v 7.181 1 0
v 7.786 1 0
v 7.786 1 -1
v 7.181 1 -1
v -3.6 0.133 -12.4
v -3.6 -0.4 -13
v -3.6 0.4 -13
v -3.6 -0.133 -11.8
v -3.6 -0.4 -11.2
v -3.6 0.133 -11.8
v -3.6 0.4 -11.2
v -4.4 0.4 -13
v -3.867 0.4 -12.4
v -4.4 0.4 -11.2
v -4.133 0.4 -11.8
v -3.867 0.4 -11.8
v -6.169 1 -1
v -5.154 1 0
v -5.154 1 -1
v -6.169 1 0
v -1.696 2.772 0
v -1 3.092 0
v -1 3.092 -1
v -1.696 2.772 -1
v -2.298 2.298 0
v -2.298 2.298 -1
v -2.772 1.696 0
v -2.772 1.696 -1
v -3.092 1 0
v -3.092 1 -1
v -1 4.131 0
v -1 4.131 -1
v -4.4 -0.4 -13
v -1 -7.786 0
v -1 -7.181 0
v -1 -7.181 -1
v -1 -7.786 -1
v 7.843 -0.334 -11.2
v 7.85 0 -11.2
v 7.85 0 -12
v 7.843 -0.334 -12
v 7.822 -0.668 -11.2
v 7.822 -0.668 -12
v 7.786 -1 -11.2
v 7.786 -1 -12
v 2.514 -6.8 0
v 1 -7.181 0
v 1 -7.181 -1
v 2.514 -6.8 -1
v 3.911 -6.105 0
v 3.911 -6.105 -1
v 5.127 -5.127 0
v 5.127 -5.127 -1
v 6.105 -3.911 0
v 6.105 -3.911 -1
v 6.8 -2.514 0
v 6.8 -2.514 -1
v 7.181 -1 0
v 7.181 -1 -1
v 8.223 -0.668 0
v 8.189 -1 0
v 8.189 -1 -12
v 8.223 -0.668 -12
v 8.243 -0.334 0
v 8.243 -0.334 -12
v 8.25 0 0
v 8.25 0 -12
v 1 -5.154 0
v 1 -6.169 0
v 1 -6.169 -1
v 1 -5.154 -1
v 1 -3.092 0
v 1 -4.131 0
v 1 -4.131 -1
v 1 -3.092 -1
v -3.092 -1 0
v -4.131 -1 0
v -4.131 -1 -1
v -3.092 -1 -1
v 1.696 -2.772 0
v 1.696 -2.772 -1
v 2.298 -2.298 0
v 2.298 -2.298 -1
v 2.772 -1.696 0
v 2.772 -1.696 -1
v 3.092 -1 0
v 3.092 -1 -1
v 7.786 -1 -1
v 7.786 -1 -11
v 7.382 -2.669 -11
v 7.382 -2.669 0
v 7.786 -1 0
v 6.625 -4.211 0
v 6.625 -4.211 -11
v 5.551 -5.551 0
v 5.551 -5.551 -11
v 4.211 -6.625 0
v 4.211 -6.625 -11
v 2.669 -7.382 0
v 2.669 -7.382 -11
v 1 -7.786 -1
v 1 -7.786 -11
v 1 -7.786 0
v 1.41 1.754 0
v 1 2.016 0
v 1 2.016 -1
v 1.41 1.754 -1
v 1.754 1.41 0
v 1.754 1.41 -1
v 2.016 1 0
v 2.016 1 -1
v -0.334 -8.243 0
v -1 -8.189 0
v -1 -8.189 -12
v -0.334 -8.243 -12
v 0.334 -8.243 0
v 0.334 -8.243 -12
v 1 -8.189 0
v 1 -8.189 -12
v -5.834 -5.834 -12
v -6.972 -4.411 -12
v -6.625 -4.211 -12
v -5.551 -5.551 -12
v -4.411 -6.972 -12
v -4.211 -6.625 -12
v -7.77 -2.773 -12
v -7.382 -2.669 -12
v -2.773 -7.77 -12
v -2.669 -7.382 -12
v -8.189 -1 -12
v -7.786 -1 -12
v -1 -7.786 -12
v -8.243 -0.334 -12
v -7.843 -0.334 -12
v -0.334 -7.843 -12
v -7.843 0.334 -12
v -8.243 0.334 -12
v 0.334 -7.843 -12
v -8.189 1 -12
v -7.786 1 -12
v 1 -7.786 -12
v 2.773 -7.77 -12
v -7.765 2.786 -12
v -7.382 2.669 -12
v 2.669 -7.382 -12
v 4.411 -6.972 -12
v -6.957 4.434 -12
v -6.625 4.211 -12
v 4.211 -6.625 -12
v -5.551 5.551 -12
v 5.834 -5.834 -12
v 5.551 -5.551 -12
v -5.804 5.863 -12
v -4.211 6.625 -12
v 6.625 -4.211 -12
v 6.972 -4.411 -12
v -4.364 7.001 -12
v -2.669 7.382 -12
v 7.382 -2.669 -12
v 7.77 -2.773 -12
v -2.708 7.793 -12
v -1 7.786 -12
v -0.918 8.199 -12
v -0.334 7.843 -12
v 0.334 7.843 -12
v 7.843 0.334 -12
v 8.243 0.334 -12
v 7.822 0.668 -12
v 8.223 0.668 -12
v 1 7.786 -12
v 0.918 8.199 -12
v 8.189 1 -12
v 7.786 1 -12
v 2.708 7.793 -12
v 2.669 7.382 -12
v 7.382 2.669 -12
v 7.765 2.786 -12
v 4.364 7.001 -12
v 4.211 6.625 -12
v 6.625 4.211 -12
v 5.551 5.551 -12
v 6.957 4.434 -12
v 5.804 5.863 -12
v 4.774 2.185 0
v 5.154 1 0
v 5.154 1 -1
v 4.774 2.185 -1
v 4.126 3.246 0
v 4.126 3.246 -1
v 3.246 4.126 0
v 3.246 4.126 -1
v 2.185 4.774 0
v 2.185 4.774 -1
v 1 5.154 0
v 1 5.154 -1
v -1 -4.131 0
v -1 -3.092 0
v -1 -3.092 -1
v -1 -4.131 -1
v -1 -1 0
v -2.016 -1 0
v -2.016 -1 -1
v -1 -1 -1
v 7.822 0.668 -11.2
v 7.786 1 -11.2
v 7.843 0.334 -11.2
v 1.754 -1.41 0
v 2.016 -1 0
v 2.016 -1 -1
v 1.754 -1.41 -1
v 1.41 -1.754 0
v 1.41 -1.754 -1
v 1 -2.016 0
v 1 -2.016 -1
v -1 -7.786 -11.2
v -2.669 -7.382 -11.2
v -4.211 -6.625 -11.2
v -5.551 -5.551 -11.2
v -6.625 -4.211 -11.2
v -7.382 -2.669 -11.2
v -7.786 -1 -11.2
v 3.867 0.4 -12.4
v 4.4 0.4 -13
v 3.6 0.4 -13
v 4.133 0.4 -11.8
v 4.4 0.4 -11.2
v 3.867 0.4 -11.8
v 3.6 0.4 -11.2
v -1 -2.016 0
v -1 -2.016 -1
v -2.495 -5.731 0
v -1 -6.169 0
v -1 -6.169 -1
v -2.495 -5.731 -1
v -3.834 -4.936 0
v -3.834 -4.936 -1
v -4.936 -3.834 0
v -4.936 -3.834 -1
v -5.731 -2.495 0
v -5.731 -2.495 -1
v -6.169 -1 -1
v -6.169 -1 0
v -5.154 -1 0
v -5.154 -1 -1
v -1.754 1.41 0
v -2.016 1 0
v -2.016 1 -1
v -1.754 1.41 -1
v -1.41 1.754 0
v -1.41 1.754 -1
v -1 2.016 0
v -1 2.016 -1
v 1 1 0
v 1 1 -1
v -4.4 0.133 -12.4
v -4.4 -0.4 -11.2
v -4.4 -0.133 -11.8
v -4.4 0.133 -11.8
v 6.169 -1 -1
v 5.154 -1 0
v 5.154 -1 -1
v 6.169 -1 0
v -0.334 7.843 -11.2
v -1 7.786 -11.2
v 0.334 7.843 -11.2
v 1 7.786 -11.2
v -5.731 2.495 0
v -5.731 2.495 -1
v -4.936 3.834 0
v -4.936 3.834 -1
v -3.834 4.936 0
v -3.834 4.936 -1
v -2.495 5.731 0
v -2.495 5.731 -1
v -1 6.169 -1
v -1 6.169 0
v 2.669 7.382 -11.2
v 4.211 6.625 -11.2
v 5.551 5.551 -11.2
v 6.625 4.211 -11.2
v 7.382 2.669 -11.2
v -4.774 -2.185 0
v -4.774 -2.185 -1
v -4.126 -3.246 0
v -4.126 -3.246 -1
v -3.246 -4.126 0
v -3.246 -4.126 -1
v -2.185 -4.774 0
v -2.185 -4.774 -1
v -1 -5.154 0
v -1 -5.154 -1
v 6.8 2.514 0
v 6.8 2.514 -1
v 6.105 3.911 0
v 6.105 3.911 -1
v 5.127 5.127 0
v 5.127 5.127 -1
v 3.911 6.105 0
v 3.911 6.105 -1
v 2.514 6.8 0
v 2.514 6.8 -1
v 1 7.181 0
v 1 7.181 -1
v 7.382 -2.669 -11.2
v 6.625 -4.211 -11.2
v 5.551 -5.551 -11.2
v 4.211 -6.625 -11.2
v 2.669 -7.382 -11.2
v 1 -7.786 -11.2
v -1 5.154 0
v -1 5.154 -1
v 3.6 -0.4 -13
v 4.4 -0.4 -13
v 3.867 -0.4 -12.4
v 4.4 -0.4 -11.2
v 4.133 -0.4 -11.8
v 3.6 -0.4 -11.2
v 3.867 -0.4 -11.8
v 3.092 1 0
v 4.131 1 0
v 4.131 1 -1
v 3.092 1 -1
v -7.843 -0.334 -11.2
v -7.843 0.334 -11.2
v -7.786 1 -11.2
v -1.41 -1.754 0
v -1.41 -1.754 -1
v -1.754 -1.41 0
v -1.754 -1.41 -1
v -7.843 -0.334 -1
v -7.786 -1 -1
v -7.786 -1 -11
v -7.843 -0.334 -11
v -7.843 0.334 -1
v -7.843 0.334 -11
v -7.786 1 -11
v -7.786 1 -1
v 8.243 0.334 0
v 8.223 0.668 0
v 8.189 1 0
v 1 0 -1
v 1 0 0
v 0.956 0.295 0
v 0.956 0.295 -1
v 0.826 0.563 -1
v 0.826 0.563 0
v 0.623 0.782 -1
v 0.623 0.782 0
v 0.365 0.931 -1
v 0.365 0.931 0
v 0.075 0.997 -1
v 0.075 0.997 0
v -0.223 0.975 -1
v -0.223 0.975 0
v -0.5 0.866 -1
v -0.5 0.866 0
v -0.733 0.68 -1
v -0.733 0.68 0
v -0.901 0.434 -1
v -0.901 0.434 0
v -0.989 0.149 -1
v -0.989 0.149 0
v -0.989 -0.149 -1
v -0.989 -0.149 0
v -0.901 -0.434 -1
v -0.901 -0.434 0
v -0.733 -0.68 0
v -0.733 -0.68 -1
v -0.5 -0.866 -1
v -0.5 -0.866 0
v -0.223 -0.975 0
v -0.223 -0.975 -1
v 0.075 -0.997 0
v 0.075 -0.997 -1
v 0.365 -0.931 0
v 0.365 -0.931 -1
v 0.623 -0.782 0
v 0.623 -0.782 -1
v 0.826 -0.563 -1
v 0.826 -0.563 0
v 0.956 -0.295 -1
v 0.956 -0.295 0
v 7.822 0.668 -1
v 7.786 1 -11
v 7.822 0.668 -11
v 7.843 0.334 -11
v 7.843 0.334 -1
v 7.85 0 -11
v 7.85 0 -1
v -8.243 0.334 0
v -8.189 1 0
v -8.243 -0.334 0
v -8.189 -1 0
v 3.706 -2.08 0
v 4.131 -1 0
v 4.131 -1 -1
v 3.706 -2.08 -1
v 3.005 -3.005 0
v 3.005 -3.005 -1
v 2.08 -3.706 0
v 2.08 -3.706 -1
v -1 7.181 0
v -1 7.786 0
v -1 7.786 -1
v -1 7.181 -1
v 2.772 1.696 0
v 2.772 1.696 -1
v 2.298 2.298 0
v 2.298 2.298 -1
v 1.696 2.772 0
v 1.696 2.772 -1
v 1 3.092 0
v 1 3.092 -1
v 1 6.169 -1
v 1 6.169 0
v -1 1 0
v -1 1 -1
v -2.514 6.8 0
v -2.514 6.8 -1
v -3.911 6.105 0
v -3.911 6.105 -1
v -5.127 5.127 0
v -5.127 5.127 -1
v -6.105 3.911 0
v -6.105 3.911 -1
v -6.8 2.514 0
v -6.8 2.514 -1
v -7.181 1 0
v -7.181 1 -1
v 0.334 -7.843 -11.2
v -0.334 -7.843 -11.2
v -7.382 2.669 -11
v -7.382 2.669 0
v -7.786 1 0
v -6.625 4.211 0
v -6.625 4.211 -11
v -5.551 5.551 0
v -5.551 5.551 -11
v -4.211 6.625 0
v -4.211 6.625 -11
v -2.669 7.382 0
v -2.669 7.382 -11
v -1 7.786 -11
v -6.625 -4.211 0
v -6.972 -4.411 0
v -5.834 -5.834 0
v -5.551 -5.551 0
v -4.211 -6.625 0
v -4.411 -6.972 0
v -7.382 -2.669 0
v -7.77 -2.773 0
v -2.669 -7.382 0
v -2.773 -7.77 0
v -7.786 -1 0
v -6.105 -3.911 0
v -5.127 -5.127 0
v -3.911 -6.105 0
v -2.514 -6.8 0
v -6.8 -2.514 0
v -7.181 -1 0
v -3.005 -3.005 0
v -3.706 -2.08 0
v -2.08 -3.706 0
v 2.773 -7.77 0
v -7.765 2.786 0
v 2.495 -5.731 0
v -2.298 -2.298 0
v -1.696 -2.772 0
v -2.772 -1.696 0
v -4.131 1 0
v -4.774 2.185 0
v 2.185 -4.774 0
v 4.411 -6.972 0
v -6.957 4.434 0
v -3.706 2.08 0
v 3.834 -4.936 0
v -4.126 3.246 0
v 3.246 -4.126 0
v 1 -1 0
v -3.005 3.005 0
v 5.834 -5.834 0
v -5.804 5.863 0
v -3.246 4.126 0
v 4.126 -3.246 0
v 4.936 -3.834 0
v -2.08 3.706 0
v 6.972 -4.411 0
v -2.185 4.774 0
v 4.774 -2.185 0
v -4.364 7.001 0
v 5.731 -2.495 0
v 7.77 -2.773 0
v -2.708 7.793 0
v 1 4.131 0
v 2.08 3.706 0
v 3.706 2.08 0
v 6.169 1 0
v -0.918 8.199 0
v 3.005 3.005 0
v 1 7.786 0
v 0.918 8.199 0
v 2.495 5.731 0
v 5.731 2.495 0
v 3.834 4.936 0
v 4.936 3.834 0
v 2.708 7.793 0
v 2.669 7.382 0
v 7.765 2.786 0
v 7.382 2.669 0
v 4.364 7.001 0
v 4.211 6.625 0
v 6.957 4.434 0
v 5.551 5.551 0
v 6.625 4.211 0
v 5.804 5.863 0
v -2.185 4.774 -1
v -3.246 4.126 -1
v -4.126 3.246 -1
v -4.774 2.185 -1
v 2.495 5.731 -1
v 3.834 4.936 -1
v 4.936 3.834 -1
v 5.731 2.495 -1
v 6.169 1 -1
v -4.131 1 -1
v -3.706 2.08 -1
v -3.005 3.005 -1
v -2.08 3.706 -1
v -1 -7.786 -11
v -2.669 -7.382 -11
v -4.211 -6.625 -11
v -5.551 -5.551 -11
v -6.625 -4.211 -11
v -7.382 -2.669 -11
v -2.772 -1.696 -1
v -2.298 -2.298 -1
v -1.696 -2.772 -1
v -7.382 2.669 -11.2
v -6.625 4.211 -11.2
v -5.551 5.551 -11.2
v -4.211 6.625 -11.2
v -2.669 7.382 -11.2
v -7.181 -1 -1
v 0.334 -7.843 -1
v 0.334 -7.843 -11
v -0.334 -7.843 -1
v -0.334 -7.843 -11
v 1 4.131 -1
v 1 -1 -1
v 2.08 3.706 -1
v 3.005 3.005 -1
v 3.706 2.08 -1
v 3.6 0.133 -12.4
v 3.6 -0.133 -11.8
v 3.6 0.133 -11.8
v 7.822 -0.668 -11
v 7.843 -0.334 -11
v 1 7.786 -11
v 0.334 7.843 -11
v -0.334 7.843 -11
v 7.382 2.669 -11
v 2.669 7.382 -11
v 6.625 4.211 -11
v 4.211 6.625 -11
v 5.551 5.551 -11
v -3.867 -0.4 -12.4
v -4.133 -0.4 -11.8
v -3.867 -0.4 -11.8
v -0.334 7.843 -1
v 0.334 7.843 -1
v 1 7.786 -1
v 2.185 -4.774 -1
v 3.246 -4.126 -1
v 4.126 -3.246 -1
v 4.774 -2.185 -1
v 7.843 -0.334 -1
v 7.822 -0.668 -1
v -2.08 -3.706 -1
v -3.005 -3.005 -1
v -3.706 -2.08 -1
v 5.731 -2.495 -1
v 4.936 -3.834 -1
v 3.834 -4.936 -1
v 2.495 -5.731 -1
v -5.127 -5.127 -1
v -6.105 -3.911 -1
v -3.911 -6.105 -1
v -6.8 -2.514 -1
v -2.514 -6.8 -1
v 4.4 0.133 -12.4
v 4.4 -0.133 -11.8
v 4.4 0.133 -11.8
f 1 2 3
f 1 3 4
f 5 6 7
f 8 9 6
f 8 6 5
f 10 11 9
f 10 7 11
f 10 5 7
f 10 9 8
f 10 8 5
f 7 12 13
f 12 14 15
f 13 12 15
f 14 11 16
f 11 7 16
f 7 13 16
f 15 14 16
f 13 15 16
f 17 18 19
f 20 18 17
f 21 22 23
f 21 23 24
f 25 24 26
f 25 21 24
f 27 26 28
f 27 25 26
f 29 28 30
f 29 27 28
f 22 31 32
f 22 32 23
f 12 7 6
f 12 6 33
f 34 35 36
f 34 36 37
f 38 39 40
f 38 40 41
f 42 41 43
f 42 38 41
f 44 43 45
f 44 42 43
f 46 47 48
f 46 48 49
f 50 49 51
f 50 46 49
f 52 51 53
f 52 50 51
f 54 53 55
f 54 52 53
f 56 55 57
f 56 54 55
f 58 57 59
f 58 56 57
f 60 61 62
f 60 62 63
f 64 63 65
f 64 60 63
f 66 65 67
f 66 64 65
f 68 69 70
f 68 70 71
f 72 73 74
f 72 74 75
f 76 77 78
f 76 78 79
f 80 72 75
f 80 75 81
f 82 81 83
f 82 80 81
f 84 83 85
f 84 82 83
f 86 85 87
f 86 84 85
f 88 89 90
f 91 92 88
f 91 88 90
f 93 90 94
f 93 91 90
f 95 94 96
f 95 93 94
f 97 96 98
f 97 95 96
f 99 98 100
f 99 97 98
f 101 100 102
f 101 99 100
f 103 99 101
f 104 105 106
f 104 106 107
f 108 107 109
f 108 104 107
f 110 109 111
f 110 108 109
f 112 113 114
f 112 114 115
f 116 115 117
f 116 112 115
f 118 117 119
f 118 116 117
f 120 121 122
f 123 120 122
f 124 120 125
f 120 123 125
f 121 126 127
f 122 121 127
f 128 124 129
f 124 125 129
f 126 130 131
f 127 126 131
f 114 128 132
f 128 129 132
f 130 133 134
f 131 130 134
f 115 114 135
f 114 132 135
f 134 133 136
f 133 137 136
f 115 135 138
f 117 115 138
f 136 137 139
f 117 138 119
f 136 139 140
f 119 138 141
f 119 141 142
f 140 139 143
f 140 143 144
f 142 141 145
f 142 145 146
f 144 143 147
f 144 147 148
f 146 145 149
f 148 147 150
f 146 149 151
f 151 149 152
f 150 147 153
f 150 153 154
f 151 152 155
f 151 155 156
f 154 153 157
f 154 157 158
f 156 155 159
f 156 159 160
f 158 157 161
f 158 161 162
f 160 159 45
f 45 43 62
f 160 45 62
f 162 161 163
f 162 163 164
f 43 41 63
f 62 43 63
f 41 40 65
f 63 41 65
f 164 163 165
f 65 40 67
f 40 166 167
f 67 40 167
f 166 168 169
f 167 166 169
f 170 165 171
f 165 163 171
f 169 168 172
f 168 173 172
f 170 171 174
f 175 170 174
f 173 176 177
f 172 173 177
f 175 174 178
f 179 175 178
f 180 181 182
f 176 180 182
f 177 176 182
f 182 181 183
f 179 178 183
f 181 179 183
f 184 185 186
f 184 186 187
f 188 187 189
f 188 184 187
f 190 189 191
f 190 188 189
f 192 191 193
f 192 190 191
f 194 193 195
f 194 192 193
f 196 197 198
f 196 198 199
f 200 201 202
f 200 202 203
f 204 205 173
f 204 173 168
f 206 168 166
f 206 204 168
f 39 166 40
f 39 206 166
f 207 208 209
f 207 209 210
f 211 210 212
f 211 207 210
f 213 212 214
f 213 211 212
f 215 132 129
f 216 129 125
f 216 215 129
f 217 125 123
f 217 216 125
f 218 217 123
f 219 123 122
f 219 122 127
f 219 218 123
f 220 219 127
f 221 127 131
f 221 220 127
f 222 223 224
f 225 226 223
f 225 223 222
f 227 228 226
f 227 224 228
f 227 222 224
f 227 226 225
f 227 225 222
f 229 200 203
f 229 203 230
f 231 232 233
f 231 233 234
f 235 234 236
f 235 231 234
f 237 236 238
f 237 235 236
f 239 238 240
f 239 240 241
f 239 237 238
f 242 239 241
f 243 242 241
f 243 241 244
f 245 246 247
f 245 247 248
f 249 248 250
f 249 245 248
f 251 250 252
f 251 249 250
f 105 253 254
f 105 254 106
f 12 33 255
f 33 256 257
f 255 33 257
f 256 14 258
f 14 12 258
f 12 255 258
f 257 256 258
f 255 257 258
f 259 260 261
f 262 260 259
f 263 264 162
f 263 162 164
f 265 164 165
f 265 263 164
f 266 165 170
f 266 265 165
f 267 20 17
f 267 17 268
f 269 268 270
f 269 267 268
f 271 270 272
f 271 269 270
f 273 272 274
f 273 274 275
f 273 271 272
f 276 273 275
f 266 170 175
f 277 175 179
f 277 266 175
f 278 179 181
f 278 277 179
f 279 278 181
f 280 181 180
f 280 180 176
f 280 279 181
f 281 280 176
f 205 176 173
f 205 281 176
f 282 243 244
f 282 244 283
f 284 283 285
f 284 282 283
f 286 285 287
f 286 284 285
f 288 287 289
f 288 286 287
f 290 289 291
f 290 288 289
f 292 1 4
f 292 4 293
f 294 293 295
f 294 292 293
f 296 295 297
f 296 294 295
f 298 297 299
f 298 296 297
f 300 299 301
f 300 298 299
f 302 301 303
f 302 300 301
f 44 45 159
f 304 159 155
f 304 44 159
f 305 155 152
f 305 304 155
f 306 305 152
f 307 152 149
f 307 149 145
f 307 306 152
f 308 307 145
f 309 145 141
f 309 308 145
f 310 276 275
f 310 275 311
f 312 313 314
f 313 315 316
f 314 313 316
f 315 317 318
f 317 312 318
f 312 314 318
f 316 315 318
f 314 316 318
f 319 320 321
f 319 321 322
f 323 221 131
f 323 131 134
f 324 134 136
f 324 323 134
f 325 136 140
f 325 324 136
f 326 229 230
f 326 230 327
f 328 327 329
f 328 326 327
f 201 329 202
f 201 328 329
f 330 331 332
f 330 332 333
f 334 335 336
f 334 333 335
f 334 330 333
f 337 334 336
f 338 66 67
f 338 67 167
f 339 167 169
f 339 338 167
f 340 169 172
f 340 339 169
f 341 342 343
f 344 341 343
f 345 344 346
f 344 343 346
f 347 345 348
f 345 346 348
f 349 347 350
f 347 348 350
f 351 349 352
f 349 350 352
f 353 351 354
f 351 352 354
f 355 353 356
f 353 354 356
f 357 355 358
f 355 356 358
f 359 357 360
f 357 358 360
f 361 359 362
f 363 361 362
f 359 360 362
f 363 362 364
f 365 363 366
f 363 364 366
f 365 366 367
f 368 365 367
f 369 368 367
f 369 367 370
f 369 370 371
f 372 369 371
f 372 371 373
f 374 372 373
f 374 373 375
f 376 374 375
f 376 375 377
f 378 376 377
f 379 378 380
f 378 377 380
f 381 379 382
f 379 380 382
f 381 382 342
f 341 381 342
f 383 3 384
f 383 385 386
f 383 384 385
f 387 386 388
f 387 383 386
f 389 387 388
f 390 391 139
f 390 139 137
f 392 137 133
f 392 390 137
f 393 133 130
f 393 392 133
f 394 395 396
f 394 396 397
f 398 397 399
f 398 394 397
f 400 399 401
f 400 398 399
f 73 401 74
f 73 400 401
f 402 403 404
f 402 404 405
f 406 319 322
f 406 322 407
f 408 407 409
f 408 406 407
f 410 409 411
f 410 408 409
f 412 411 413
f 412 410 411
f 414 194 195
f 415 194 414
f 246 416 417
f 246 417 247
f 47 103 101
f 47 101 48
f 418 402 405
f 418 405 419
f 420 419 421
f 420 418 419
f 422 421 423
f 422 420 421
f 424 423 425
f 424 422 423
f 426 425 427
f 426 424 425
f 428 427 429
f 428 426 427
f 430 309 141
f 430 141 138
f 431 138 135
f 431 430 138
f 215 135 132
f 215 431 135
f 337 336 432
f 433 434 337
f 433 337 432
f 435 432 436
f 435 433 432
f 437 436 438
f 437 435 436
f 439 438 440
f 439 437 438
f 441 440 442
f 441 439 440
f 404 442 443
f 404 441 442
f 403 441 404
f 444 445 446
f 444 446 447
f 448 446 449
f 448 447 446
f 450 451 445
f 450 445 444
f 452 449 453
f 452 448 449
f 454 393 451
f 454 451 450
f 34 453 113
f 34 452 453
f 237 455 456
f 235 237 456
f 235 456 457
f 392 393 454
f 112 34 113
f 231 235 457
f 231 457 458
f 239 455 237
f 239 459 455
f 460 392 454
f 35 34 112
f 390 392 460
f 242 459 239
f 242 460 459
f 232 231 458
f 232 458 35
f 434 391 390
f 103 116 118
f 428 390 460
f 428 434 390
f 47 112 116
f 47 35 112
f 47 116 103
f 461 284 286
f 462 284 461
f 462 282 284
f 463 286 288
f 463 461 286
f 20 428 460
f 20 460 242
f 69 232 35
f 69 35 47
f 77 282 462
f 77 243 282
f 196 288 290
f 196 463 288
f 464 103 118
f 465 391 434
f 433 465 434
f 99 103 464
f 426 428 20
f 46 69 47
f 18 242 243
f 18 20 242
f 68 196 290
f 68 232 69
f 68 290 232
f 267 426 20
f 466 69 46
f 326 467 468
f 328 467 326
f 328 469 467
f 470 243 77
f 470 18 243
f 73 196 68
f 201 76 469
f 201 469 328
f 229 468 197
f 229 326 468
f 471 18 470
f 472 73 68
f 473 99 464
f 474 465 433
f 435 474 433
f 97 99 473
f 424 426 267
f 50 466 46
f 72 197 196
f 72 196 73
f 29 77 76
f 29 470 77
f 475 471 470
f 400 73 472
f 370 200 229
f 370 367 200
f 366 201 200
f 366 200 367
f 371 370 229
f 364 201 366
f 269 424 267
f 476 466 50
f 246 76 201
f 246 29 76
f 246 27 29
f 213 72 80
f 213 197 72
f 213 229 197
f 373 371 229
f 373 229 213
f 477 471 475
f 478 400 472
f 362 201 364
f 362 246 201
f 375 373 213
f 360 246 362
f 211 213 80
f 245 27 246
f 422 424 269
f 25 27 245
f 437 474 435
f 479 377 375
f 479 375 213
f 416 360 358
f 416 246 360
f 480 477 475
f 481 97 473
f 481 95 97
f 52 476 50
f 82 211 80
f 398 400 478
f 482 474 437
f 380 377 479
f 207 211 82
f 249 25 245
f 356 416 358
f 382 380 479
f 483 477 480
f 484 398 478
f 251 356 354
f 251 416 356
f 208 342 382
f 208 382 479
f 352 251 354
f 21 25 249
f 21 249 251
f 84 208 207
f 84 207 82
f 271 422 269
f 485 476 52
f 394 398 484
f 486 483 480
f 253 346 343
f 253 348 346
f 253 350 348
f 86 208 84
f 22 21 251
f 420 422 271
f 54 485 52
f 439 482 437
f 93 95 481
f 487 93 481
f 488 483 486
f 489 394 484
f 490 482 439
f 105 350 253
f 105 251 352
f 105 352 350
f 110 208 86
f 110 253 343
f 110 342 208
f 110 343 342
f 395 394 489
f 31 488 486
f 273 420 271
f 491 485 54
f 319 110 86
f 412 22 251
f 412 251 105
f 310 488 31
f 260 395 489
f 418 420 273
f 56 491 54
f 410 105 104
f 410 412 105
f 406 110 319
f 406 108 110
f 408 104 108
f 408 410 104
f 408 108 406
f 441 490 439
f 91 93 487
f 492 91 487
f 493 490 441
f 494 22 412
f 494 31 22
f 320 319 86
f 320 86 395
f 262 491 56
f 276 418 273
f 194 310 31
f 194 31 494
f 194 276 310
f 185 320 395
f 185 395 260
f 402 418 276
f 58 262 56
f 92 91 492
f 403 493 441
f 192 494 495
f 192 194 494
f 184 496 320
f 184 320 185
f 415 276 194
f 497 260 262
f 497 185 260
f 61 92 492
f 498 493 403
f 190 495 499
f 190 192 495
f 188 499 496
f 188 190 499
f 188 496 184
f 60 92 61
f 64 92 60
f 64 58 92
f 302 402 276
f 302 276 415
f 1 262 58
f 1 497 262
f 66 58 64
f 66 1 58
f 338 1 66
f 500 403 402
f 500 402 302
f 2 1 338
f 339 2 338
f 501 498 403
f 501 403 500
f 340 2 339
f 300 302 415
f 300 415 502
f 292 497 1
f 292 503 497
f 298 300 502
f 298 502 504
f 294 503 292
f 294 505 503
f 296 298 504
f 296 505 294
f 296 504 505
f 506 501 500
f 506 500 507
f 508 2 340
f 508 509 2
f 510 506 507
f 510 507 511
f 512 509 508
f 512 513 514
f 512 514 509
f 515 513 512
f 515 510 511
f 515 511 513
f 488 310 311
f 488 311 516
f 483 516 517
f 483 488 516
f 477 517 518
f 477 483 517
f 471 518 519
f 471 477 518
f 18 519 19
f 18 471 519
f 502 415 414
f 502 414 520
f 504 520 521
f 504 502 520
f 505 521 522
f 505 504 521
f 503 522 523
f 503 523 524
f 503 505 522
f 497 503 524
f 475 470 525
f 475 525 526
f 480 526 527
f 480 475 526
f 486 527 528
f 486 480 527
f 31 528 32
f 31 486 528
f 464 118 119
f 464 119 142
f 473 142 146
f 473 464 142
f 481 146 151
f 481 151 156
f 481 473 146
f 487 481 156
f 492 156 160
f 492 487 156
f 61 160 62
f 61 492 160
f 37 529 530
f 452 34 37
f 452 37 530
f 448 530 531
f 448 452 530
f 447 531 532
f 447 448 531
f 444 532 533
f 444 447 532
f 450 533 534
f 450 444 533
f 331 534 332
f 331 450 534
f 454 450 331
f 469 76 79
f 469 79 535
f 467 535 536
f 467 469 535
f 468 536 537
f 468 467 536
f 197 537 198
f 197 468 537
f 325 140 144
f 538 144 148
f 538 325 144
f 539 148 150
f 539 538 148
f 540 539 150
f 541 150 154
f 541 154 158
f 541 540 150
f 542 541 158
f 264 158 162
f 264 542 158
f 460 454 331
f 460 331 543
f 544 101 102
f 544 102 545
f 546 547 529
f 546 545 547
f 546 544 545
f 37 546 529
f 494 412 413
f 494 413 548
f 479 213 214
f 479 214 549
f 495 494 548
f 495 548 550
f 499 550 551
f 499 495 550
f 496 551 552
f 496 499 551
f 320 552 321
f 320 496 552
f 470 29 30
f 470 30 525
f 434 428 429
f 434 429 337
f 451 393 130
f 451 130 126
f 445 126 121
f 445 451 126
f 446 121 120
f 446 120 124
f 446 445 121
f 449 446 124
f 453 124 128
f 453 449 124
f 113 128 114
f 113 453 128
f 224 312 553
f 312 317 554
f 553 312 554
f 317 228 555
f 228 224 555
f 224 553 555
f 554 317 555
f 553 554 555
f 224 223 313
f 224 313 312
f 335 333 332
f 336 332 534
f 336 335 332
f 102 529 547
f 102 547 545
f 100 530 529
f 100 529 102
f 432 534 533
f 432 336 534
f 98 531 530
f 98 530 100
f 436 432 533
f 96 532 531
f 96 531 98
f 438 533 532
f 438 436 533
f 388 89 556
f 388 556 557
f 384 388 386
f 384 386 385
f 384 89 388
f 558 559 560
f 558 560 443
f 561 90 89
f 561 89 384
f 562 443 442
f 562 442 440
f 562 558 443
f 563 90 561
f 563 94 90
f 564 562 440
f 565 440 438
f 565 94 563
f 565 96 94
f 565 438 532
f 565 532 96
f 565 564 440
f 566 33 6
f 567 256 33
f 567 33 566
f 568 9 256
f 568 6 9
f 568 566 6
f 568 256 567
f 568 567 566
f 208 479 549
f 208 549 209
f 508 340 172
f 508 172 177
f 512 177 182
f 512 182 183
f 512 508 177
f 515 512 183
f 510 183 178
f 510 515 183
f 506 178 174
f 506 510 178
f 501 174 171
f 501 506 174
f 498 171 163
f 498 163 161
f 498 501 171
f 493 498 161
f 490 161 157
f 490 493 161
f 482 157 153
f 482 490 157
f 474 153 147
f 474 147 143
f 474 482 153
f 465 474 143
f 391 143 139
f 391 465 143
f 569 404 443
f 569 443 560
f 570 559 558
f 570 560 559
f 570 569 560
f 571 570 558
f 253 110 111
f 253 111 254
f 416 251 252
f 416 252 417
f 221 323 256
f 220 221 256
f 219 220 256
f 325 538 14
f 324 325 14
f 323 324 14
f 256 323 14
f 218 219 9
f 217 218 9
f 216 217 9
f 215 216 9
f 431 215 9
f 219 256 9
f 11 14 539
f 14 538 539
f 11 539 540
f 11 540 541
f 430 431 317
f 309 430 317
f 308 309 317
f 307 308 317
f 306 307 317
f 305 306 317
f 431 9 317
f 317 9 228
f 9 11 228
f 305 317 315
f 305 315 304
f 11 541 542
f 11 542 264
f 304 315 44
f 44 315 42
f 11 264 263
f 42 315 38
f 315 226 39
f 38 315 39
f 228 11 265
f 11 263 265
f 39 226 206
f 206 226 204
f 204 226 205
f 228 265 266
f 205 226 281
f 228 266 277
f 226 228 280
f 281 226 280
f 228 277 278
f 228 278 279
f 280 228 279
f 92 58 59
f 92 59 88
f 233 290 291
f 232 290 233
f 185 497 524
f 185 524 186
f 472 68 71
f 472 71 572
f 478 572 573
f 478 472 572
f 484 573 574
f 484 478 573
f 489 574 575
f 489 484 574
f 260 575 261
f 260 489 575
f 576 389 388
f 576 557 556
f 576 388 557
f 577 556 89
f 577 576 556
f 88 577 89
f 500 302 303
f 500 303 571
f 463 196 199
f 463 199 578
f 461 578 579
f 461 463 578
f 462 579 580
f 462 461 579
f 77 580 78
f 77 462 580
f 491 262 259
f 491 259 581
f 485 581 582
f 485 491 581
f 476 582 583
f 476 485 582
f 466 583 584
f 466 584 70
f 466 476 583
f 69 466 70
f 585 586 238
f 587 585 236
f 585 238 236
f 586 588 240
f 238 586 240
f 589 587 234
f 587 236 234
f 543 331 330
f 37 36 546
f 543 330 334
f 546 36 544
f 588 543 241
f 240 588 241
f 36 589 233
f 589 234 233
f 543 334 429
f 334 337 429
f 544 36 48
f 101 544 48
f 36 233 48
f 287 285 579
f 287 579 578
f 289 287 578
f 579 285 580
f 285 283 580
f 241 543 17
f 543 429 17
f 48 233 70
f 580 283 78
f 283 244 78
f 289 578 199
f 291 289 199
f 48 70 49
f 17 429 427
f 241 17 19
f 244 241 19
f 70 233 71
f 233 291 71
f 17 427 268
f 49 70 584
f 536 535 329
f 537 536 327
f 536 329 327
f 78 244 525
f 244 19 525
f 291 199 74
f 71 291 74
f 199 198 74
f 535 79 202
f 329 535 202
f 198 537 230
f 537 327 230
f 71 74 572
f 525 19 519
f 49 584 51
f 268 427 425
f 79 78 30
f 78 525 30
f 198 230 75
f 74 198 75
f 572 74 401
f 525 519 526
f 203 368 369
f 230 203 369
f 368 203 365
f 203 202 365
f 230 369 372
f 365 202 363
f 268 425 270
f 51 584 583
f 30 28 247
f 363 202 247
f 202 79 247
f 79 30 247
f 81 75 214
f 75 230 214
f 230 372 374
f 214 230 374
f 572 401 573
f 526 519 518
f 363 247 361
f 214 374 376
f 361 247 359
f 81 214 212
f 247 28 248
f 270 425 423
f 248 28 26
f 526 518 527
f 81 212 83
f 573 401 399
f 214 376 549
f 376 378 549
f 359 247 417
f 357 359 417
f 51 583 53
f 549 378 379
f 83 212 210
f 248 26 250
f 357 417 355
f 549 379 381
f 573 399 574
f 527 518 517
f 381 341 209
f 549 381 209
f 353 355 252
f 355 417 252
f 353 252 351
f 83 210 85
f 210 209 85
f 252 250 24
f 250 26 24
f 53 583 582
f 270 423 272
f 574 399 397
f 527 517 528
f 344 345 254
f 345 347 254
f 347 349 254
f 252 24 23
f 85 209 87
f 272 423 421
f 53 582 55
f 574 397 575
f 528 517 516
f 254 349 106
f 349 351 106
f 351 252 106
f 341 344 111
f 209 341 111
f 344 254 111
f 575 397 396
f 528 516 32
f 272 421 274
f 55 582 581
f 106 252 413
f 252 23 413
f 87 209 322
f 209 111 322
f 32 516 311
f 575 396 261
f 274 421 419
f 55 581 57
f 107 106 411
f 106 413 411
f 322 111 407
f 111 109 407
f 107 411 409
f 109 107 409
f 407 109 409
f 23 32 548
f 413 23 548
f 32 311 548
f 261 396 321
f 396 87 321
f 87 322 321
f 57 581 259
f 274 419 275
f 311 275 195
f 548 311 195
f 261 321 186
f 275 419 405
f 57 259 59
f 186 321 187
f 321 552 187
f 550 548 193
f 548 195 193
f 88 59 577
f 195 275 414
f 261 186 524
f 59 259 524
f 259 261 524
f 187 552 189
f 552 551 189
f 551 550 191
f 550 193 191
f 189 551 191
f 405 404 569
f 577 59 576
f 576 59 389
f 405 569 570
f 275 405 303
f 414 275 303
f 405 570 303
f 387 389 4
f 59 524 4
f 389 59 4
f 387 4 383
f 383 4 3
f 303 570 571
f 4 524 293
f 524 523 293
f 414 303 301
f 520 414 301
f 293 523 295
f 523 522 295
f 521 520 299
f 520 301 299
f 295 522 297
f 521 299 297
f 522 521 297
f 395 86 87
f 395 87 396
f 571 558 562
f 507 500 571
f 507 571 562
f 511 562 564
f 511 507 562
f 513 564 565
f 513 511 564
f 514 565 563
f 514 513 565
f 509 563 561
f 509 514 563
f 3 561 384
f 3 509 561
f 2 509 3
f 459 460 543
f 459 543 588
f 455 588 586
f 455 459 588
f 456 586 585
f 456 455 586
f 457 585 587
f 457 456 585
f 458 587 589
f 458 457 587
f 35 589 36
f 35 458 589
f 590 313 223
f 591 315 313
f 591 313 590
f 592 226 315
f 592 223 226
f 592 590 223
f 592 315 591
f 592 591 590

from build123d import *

# Parameters (mm, degrees)
F0_R     = 1
F3_DEPTH = 1
F4_DEPTH = 12
F2_R     = 7.92
F2_R_2   = 7.12
F5_DEPTH = 0.2
F6_DEPTH = 2


with BuildPart() as f3:
    # F0 (on Top) → F3 (new body)
    with BuildSketch(Plane.XY):
        with BuildLine():
            Line((-1, 7.7860452092), (-1, 7.1807033082))
            ThreePointArc((-1, 7.1807033082), (-5.1265241636, 5.1265241636), (-7.1807033082, 1))
            Line((-7.1807033082, 1), (-7.7860452092, 1))
            ThreePointArc((-7.7860452092, 1), (-7.85, 0), (-7.7860452092, -1))
            Line((-7.7860452092, -1), (-7.1807033082, -1))
            ThreePointArc((-7.1807033082, -1), (-5.1265241636, -5.1265241636), (-1, -7.1807033082))
            Line((-1, -7.1807033082), (-1, -7.7860452092))
            ThreePointArc((-1, -7.7860452092), (0, -7.85), (1, -7.7860452092))
            Line((1, -7.7860452092), (1, -7.1807033082))
            ThreePointArc((1, -7.1807033082), (5.1265241636, -5.1265241636), (7.1807033082, -1))
            Line((7.1807033082, -1), (7.7860452092, -1))
            ThreePointArc((7.7860452092, -1), (7.8339949864, -0.5010215103), (7.85, 0))
            ThreePointArc((7.85, 0), (7.8339949864, 0.5010215103), (7.7860452092, 1))
            Line((7.7860452092, 1), (7.1807033082, 1))
            ThreePointArc((7.1807033082, 1), (5.1265241636, 5.1265241636), (1, 7.1807033082))
            Line((1, 7.1807033082), (1, 7.7860452092))
            ThreePointArc((1, 7.7860452092), (0, 7.85), (-1, 7.7860452092))
        make_face()
        with BuildLine():
            Line((-6.1694813396, -1), (-5.153882032, -1))
            ThreePointArc((-5.153882032, -1), (-3.7123106012, -3.7123106012), (-1, -5.153882032))
            Line((-1, -5.153882032), (-1, -6.1694813396))
            ThreePointArc((-1, -6.1694813396), (-4.4194173824, -4.4194173824), (-6.1694813396, -1))
        make_face(mode=Mode.SUBTRACT)
        with BuildLine():
            ThreePointArc((-1, -4.1306779105), (-3.00520382, -3.00520382), (-4.1306779105, -1))
            Line((-4.1306779105, -1), (-3.0923292192, -1))
            ThreePointArc((-3.0923292192, -1), (-2.2980970389, -2.2980970389), (-1, -3.0923292192))
            Line((-1, -3.0923292192), (-1, -4.1306779105))
        make_face(mode=Mode.SUBTRACT)
        with BuildLine():
            ThreePointArc((-1, -2.0155644371), (-1.5909902577, -1.5909902577), (-2.0155644371, -1))
            Line((-2.0155644371, -1), (-1, -1))
            Line((-1, -1), (-1, -2.0155644371))
        make_face(mode=Mode.SUBTRACT)
        with BuildLine():
            ThreePointArc((6.1694813396, -1), (4.4194173824, -4.4194173824), (1, -6.1694813396))
            Line((1, -6.1694813396), (1, -5.153882032))
            ThreePointArc((1, -5.153882032), (3.7123106012, -3.7123106012), (5.153882032, -1))
            Line((5.153882032, -1), (6.1694813396, -1))
        make_face(mode=Mode.SUBTRACT)
        with BuildLine():
            Line((3.0923292192, -1), (4.1306779105, -1))
            ThreePointArc((4.1306779105, -1), (3.00520382, -3.00520382), (1, -4.1306779105))
            Line((1, -4.1306779105), (1, -3.0923292192))
            ThreePointArc((1, -3.0923292192), (2.2980970389, -2.2980970389), (3.0923292192, -1))
        make_face(mode=Mode.SUBTRACT)
        with BuildLine():
            Line((1, -1), (2.0155644371, -1))
            ThreePointArc((2.0155644371, -1), (1.5909902577, -1.5909902577), (1, -2.0155644371))
            Line((1, -2.0155644371), (1, -1))
        make_face(mode=Mode.SUBTRACT)
        with BuildLine():
            ThreePointArc((-2.0155644371, 1), (-1.5909902577, 1.5909902577), (-1, 2.0155644371))
            Line((-1, 2.0155644371), (-1, 1))
            Line((-1, 1), (-2.0155644371, 1))
        make_face(mode=Mode.SUBTRACT)
        with BuildLine():
            ThreePointArc((-1, 3.0923292192), (-2.2980970389, 2.2980970389), (-3.0923292192, 1))
            Line((-3.0923292192, 1), (-4.1306779105, 1))
            ThreePointArc((-4.1306779105, 1), (-3.00520382, 3.00520382), (-1, 4.1306779105))
            Line((-1, 4.1306779105), (-1, 3.0923292192))
        make_face(mode=Mode.SUBTRACT)
        with BuildLine():
            ThreePointArc((-6.1694813396, 1), (-4.4194173824, 4.4194173824), (-1, 6.1694813396))
            Line((-1, 6.1694813396), (-1, 5.153882032))
            ThreePointArc((-1, 5.153882032), (-3.7123106012, 3.7123106012), (-5.153882032, 1))
            Line((-5.153882032, 1), (-6.1694813396, 1))
        make_face(mode=Mode.SUBTRACT)
        Circle(F0_R, mode=Mode.SUBTRACT)
        with BuildLine():
            ThreePointArc((1, 2.0155644371), (1.5909902577, 1.5909902577), (2.0155644371, 1))
            Line((2.0155644371, 1), (1, 1))
            Line((1, 1), (1, 2.0155644371))
        make_face(mode=Mode.SUBTRACT)
        with BuildLine():
            Line((4.1306779105, 1), (3.0923292192, 1))
            ThreePointArc((3.0923292192, 1), (2.2980970389, 2.2980970389), (1, 3.0923292192))
            Line((1, 3.0923292192), (1, 4.1306779105))
            ThreePointArc((1, 4.1306779105), (3.00520382, 3.00520382), (4.1306779105, 1))
        make_face(mode=Mode.SUBTRACT)
        with BuildLine():
            Line((1, 5.153882032), (1, 6.1694813396))
            ThreePointArc((1, 6.1694813396), (4.4194173824, 4.4194173824), (6.1694813396, 1))
            Line((6.1694813396, 1), (5.153882032, 1))
            ThreePointArc((5.153882032, 1), (3.7123106012, 3.7123106012), (1, 5.153882032))
        make_face(mode=Mode.SUBTRACT)
    extrude(amount=-F3_DEPTH)

    # F0 (on Top) → F4 (join)
    with BuildSketch(Plane.XY):
        with BuildLine():
            ThreePointArc((8.1891696771, -1), (8.234778377, -0.5009242278), (8.25, 0))
            ThreePointArc((8.25, 0), (8.234778377, 0.5009242278), (8.1891696771, 1))
            Line((8.1891696771, 1), (8.1891696771, -1))
        make_face()
        with BuildLine():
            Line((8.1891696771, -1), (8.1891696771, 1))
            ThreePointArc((8.1891696771, 1), (0, 8.25), (-8.1891696771, 1))
            Line((-8.1891696771, 1), (-8.1891696771, -1))
            ThreePointArc((-8.1891696771, -1), (-5.8336309448, -5.8336309448), (-1, -8.1891696771))
            Line((-1, -8.1891696771), (1, -8.1891696771))
            ThreePointArc((1, -8.1891696771), (5.8336309448, -5.8336309448), (8.1891696771, -1))
        make_face()
        with BuildLine():
            ThreePointArc((-7.7860452092, 1), (-5.5507882323, 5.5507882323), (-1, 7.7860452092))
            ThreePointArc((-1, 7.7860452092), (0, 7.85), (1, 7.7860452092))
            ThreePointArc((1, 7.7860452092), (5.5507882323, 5.5507882323), (7.7860452092, 1))
            ThreePointArc((7.7860452092, 1), (7.8339949864, 0.5010215103), (7.85, 0))
            ThreePointArc((7.85, 0), (7.8339949864, -0.5010215103), (7.7860452092, -1))
            ThreePointArc((7.7860452092, -1), (5.5507882323, -5.5507882323), (1, -7.7860452092))
            ThreePointArc((1, -7.7860452092), (0, -7.85), (-1, -7.7860452092))
            ThreePointArc((-1, -7.7860452092), (-5.5507882323, -5.5507882323), (-7.7860452092, -1))
            ThreePointArc((-7.7860452092, -1), (-7.85, 0), (-7.7860452092, 1))
        make_face(mode=Mode.SUBTRACT)
        with BuildLine():
            Line((-8.1891696771, -1), (-8.1891696771, 1))
            ThreePointArc((-8.1891696771, 1), (-8.25, 0), (-8.1891696771, -1))
        make_face()
        with BuildLine():
            ThreePointArc((-1, -8.1891696771), (0, -8.25), (1, -8.1891696771))
            Line((1, -8.1891696771), (-1, -8.1891696771))
        make_face()
    extrude(amount=-F4_DEPTH)

    # F2 (on offset) → F5 (join)
    with BuildSketch(Plane.XY.offset(-11)):
        Circle(F2_R)
        Circle(F2_R_2, mode=Mode.SUBTRACT)
        Circle(F2_R_2)
        with BuildLine():
            add(Edge.make_bspline(
                [(-4.4, -0.4), (-4.1333333333, -0.4), (-3.8666666667, -0.4), (-3.6, -0.4)],
                knots=[0, 0, 0, 0, 1, 1, 1, 1], degree=3))
            add(Edge.make_bspline(
                [(-4.4, -0.4), (-4.4, -0.1333333333), (-4.4, 0.1333333333), (-4.4, 0.4)],
                knots=[0, 0, 0, 0, 1, 1, 1, 1], degree=3))
            add(Edge.make_bspline(
                [(-4.4, 0.4), (-4.1333333333, 0.4), (-3.8666666667, 0.4), (-3.6, 0.4)],
                knots=[0, 0, 0, 0, 1, 1, 1, 1], degree=3))
            add(Edge.make_bspline(
                [(-3.6, -0.4), (-3.6, -0.1333333333), (-3.6, 0.1333333333), (-3.6, 0.4)],
                knots=[0, 0, 0, 0, 1, 1, 1, 1], degree=3))
        make_face(mode=Mode.SUBTRACT)
        with BuildLine():
            add(Edge.make_bspline(
                [(4.4, -0.4), (4.1333333333, -0.4), (3.8666666667, -0.4), (3.6, -0.4)],
                knots=[0, 0, 0, 0, 1, 1, 1, 1], degree=3))
            add(Edge.make_bspline(
                [(3.6, -0.4), (3.6, -0.1333333333), (3.6, 0.1333333333), (3.6, 0.4)],
                knots=[0, 0, 0, 0, 1, 1, 1, 1], degree=3))
            add(Edge.make_bspline(
                [(4.4, 0.4), (4.1333333333, 0.4), (3.8666666667, 0.4), (3.6, 0.4)],
                knots=[0, 0, 0, 0, 1, 1, 1, 1], degree=3))
            add(Edge.make_bspline(
                [(4.4, -0.4), (4.4, -0.1333333333), (4.4, 0.1333333333), (4.4, 0.4)],
                knots=[0, 0, 0, 0, 1, 1, 1, 1], degree=3))
        make_face(mode=Mode.SUBTRACT)
    extrude(amount=-F5_DEPTH)

    # F2 (on offset) → F6 (join)
    with BuildSketch(Plane.XY.offset(-11)):
        with BuildLine():
            add(Edge.make_bspline(
                [(-4.4, -0.4), (-4.4, -0.1333333333), (-4.4, 0.1333333333), (-4.4, 0.4)],
                knots=[0, 0, 0, 0, 1, 1, 1, 1], degree=3))
            add(Edge.make_bspline(
                [(-4.4, -0.4), (-4.1333333333, -0.4), (-3.8666666667, -0.4), (-3.6, -0.4)],
                knots=[0, 0, 0, 0, 1, 1, 1, 1], degree=3))
            add(Edge.make_bspline(
                [(-3.6, -0.4), (-3.6, -0.1333333333), (-3.6, 0.1333333333), (-3.6, 0.4)],
                knots=[0, 0, 0, 0, 1, 1, 1, 1], degree=3))
            add(Edge.make_bspline(
                [(-4.4, 0.4), (-4.1333333333, 0.4), (-3.8666666667, 0.4), (-3.6, 0.4)],
                knots=[0, 0, 0, 0, 1, 1, 1, 1], degree=3))
        make_face()
        with BuildLine():
            add(Edge.make_bspline(
                [(3.6, -0.4), (3.6, -0.1333333333), (3.6, 0.1333333333), (3.6, 0.4)],
                knots=[0, 0, 0, 0, 1, 1, 1, 1], degree=3))
            add(Edge.make_bspline(
                [(4.4, -0.4), (4.1333333333, -0.4), (3.8666666667, -0.4), (3.6, -0.4)],
                knots=[0, 0, 0, 0, 1, 1, 1, 1], degree=3))
            add(Edge.make_bspline(
                [(4.4, -0.4), (4.4, -0.1333333333), (4.4, 0.1333333333), (4.4, 0.4)],
                knots=[0, 0, 0, 0, 1, 1, 1, 1], degree=3))
            add(Edge.make_bspline(
                [(4.4, 0.4), (4.1333333333, 0.4), (3.8666666667, 0.4), (3.6, 0.4)],
                knots=[0, 0, 0, 0, 1, 1, 1, 1], degree=3))
        make_face()
    extrude(amount=-F6_DEPTH)


solid = f3.part
